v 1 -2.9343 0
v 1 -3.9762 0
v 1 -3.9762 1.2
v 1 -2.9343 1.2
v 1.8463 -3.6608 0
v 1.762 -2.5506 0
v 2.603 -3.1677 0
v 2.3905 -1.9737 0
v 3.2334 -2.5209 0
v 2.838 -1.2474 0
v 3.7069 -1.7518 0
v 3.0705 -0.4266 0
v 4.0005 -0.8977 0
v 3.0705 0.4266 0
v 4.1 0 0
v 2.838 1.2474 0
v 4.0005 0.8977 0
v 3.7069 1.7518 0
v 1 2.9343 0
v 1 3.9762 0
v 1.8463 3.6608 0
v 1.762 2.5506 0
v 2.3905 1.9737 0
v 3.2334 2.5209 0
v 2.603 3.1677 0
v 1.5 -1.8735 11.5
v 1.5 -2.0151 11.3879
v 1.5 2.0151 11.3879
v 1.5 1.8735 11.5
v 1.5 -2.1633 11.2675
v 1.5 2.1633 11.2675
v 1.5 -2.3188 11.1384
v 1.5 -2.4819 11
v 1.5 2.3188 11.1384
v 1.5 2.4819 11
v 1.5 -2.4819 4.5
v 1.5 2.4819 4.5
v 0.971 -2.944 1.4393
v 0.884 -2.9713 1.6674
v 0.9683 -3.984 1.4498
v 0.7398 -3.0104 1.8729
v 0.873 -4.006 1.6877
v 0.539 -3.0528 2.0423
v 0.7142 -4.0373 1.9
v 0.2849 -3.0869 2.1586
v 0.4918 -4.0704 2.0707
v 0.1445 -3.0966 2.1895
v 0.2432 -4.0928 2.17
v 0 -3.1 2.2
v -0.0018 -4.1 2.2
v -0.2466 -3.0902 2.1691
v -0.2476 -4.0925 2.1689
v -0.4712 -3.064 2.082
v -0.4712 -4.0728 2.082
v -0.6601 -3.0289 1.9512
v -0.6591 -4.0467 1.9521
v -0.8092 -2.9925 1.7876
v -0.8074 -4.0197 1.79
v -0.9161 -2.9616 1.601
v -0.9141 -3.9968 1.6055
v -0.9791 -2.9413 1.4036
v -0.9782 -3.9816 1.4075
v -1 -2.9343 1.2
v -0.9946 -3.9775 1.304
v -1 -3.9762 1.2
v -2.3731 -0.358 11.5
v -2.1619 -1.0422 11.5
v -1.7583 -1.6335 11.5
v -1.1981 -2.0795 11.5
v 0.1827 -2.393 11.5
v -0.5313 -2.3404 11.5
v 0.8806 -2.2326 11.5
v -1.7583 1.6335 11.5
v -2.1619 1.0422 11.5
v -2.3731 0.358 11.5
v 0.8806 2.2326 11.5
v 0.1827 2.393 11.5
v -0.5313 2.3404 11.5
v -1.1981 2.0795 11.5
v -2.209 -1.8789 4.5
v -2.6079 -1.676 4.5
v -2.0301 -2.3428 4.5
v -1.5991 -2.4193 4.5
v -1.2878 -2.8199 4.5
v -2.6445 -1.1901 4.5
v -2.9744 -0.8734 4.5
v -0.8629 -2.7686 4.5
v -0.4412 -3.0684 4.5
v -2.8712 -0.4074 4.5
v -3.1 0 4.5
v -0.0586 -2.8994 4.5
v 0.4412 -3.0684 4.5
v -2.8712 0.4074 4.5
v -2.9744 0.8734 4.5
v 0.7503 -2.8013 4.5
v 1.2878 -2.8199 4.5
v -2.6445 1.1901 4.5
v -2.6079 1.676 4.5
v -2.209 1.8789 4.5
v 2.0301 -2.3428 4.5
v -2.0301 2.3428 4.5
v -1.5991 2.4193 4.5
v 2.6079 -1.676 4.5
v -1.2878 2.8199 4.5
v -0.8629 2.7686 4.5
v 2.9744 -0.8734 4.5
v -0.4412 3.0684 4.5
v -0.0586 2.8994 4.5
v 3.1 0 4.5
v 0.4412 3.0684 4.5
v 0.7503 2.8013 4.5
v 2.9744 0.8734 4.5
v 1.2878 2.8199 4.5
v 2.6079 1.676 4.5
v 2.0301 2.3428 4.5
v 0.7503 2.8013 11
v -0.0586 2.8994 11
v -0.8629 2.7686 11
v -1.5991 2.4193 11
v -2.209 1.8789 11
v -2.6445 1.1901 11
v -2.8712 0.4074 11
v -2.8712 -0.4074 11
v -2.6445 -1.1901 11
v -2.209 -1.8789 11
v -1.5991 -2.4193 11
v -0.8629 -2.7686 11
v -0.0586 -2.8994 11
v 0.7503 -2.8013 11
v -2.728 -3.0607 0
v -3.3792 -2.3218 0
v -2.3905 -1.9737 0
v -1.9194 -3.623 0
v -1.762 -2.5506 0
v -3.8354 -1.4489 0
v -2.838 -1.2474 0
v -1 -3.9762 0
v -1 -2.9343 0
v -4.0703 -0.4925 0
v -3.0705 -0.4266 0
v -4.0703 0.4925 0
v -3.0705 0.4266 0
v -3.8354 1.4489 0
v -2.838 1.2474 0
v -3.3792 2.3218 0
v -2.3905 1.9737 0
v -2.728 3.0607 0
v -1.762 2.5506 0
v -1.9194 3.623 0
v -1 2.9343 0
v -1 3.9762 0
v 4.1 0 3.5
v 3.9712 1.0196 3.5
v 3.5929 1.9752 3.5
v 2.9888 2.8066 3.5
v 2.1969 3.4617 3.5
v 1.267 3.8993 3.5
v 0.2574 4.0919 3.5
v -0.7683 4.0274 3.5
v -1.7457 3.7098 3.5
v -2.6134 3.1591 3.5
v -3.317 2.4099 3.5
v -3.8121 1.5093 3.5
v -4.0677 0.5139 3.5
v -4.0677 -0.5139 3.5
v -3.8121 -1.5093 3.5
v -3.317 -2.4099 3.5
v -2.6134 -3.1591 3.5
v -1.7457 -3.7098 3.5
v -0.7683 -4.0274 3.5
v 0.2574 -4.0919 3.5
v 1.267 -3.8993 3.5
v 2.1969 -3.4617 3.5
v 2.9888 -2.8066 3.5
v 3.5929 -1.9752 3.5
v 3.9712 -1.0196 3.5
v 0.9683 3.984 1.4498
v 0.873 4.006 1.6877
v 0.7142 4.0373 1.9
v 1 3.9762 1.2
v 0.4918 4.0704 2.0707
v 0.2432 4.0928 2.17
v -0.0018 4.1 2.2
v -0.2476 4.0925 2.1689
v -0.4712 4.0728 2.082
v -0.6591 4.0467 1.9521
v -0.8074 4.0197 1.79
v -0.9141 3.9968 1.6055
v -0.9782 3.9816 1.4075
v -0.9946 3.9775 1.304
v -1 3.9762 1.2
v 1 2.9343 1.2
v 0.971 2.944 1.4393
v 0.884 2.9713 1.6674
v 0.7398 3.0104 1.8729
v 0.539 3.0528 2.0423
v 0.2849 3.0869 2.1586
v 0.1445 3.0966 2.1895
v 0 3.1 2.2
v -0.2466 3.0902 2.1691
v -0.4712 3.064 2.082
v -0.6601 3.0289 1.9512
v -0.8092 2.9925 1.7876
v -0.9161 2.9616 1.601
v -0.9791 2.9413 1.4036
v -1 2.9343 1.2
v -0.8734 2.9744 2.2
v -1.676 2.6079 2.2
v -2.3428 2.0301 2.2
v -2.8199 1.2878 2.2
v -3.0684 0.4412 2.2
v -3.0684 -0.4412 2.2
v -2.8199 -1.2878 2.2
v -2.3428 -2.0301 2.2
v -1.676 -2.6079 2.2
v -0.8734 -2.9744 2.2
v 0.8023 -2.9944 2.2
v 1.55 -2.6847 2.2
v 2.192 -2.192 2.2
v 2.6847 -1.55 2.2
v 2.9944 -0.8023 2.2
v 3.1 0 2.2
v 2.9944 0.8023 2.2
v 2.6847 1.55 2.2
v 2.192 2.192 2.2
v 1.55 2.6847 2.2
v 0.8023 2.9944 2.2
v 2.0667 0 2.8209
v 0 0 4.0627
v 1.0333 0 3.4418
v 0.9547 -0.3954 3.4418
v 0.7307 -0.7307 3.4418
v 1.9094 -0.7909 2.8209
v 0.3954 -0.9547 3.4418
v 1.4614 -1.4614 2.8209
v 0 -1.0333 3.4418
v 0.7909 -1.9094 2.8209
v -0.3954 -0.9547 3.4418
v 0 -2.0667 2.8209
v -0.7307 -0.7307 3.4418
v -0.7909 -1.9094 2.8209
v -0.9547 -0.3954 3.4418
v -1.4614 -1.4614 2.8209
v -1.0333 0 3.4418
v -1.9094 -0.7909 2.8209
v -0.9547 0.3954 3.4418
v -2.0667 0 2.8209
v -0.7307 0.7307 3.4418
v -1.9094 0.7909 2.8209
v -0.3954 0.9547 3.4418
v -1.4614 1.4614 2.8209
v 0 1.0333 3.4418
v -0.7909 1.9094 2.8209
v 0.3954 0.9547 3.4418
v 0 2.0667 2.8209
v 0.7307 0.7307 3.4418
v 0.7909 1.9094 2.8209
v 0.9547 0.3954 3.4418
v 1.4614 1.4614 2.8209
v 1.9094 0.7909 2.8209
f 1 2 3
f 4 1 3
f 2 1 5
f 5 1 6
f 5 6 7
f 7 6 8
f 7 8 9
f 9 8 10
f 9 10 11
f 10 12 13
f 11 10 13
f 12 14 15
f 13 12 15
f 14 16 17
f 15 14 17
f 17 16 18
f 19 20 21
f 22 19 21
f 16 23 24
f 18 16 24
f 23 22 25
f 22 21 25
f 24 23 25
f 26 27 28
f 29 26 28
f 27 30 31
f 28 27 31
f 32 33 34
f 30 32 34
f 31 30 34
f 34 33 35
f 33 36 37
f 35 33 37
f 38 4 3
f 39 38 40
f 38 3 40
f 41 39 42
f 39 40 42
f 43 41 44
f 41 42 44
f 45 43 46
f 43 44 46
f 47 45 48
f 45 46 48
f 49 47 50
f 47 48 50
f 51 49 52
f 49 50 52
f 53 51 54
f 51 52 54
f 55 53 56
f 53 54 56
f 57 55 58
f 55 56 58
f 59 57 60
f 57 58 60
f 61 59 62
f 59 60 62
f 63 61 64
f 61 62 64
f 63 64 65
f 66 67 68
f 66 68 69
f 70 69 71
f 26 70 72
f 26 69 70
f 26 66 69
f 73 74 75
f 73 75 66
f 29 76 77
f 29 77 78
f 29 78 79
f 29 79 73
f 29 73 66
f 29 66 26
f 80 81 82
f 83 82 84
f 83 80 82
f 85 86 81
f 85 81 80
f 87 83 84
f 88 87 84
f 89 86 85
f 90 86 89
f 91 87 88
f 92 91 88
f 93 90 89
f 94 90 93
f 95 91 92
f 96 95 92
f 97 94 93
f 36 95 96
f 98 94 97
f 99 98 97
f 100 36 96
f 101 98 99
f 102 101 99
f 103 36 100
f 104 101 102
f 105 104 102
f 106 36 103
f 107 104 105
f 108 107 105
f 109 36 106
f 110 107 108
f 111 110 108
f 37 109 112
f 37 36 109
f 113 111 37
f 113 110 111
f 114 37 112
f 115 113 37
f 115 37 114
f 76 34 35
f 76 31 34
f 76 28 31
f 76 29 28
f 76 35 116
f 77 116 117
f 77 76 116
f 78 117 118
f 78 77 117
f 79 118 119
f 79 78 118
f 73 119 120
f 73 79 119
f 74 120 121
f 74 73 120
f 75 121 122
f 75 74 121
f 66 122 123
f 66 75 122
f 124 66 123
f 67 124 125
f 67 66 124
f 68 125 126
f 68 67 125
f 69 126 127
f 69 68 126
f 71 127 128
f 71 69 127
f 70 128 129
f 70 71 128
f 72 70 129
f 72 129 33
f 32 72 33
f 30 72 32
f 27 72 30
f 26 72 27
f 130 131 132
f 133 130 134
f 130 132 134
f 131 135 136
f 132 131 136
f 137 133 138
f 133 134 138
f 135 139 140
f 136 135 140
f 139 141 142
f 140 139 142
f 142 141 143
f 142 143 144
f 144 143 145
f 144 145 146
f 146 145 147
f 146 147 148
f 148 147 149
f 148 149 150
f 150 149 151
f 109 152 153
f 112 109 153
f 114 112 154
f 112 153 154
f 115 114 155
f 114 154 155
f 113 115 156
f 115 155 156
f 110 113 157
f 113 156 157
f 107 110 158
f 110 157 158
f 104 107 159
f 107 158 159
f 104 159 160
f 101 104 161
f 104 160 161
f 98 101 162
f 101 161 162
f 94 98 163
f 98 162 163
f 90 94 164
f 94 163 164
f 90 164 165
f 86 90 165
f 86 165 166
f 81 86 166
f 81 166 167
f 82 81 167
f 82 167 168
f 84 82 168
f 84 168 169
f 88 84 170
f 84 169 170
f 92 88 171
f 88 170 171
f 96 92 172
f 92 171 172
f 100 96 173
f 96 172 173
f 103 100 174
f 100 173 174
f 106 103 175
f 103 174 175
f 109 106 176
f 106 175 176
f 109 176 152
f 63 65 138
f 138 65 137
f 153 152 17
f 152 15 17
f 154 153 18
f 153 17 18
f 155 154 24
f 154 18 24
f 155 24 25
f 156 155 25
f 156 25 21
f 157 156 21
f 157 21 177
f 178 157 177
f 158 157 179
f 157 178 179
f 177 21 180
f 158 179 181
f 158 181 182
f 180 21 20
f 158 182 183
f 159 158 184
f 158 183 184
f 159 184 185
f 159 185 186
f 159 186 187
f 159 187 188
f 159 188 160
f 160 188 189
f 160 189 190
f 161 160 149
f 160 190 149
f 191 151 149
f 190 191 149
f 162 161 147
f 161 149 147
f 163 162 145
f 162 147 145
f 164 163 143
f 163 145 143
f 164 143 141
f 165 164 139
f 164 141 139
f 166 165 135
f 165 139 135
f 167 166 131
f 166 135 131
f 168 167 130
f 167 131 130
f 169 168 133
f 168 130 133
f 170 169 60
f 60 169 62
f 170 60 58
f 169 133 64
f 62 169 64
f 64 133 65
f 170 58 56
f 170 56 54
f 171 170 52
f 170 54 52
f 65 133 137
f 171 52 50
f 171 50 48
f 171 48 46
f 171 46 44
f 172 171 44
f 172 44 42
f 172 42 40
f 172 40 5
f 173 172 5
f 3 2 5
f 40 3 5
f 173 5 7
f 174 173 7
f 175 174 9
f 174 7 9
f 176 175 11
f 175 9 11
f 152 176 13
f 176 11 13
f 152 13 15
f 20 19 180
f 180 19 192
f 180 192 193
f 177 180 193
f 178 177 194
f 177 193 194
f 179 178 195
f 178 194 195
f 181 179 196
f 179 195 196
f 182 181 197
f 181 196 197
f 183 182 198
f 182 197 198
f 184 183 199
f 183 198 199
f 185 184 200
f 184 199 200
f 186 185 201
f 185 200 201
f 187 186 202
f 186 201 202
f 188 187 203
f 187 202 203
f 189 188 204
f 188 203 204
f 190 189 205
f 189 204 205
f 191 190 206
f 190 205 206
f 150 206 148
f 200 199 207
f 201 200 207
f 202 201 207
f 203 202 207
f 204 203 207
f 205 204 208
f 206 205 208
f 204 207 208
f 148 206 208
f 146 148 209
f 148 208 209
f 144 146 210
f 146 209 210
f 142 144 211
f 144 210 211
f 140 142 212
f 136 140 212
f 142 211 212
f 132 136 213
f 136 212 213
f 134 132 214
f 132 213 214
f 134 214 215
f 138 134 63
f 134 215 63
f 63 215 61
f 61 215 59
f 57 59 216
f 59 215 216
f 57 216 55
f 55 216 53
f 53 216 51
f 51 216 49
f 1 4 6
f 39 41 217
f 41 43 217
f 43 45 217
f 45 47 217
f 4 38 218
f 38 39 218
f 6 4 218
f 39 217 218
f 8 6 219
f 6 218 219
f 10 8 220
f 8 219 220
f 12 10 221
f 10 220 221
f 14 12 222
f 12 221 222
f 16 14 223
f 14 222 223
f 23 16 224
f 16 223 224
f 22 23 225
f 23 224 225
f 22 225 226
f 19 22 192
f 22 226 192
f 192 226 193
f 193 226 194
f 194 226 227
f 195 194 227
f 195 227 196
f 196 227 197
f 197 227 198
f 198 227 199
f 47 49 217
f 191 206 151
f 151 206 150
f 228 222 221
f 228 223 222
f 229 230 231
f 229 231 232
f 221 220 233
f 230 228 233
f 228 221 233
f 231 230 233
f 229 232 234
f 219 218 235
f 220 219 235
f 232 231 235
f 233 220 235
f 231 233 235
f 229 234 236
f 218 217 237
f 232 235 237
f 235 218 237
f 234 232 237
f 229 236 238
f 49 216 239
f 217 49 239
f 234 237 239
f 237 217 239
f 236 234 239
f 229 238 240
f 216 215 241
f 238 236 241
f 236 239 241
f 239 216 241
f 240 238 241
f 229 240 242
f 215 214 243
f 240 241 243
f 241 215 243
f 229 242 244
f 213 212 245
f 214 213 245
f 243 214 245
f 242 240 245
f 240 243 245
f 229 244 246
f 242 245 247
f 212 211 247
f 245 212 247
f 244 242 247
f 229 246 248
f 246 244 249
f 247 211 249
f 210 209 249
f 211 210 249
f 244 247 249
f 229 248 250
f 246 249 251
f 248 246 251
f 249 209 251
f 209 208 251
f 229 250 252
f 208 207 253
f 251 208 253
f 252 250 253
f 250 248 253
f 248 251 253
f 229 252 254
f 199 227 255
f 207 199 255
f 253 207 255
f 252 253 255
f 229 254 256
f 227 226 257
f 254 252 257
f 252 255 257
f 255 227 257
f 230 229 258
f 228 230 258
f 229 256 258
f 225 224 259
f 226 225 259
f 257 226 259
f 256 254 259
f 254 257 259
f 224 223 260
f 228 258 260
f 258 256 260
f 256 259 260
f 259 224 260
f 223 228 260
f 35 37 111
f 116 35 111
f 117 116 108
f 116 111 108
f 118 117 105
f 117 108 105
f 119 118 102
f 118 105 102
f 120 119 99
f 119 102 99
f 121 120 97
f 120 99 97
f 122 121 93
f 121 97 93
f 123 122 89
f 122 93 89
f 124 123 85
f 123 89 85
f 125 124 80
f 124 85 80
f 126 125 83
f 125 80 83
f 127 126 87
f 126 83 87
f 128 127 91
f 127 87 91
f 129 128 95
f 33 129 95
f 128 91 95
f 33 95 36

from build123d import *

# Parameters (mm, degrees)
F0_R     = 4.1
F1_DEPTH = 4.5
F2_D     = 6.2
F2_DEPTH = 2.2
F2_TIP   = 1.862667919
F4_DEPTH = 7
F5_SIZE  = 0.5
F6_SIZE  = 1
F8_DEPTH = 25


with BuildPart() as f1:
    # F0 (on Top) → F1 (new body)
    with BuildSketch(Plane.XY):
        Circle(F0_R)
    extrude(amount=F1_DEPTH)

    # F2
    with Locations(Plane(origin=(0, 0, 0), x_dir=(1, 0, 0), z_dir=(0, 0, -1))):
        with Locations((0, 0)):
            Hole(F2_D / 2, depth=F2_DEPTH)
            with Locations((0, 0, -(F2_DEPTH + F2_TIP / 2))):  # 118° drill point
                Cone(0, F2_D / 2, F2_TIP, mode=Mode.SUBTRACT)

    # F3 (on face) → F4 (join)
    with BuildSketch(Plane.XY.offset(4.5)):
        with BuildLine():
            Line((1.5, -2.4819347292), (1.5, 2.4819347292))
            ThreePointArc((1.5, 2.4819347292), (-2.9, 0), (1.5, -2.4819347292))
        make_face()
    extrude(amount=F4_DEPTH)

    # F5
    f5_edges = [f1.edges().sort_by_distance(p)[0] for p in [
        (-2.9, 0, 11.5),
    ]]
    chamfer(f5_edges, length=F5_SIZE)

    # F6
    f6_edges = [f1.edges().sort_by_distance(p)[0] for p in [
        (-4.1, 0, 4.5),
    ]]
    chamfer(f6_edges, length=F6_SIZE)

    # F7 (on Front) → F8 (cut, symmetric)
    with BuildSketch(Plane.XZ):
        with BuildLine():
            Line((-1, 1.2), (-1, 0))
            Line((-1, 0), (1, 0))
            Line((1, 0), (1, 1.2))
            ThreePointArc((1, 1.2), (0, 2.2), (-1, 1.2))
        make_face()
    extrude(amount=F8_DEPTH, both=True, mode=Mode.SUBTRACT)


solid = f1.part
